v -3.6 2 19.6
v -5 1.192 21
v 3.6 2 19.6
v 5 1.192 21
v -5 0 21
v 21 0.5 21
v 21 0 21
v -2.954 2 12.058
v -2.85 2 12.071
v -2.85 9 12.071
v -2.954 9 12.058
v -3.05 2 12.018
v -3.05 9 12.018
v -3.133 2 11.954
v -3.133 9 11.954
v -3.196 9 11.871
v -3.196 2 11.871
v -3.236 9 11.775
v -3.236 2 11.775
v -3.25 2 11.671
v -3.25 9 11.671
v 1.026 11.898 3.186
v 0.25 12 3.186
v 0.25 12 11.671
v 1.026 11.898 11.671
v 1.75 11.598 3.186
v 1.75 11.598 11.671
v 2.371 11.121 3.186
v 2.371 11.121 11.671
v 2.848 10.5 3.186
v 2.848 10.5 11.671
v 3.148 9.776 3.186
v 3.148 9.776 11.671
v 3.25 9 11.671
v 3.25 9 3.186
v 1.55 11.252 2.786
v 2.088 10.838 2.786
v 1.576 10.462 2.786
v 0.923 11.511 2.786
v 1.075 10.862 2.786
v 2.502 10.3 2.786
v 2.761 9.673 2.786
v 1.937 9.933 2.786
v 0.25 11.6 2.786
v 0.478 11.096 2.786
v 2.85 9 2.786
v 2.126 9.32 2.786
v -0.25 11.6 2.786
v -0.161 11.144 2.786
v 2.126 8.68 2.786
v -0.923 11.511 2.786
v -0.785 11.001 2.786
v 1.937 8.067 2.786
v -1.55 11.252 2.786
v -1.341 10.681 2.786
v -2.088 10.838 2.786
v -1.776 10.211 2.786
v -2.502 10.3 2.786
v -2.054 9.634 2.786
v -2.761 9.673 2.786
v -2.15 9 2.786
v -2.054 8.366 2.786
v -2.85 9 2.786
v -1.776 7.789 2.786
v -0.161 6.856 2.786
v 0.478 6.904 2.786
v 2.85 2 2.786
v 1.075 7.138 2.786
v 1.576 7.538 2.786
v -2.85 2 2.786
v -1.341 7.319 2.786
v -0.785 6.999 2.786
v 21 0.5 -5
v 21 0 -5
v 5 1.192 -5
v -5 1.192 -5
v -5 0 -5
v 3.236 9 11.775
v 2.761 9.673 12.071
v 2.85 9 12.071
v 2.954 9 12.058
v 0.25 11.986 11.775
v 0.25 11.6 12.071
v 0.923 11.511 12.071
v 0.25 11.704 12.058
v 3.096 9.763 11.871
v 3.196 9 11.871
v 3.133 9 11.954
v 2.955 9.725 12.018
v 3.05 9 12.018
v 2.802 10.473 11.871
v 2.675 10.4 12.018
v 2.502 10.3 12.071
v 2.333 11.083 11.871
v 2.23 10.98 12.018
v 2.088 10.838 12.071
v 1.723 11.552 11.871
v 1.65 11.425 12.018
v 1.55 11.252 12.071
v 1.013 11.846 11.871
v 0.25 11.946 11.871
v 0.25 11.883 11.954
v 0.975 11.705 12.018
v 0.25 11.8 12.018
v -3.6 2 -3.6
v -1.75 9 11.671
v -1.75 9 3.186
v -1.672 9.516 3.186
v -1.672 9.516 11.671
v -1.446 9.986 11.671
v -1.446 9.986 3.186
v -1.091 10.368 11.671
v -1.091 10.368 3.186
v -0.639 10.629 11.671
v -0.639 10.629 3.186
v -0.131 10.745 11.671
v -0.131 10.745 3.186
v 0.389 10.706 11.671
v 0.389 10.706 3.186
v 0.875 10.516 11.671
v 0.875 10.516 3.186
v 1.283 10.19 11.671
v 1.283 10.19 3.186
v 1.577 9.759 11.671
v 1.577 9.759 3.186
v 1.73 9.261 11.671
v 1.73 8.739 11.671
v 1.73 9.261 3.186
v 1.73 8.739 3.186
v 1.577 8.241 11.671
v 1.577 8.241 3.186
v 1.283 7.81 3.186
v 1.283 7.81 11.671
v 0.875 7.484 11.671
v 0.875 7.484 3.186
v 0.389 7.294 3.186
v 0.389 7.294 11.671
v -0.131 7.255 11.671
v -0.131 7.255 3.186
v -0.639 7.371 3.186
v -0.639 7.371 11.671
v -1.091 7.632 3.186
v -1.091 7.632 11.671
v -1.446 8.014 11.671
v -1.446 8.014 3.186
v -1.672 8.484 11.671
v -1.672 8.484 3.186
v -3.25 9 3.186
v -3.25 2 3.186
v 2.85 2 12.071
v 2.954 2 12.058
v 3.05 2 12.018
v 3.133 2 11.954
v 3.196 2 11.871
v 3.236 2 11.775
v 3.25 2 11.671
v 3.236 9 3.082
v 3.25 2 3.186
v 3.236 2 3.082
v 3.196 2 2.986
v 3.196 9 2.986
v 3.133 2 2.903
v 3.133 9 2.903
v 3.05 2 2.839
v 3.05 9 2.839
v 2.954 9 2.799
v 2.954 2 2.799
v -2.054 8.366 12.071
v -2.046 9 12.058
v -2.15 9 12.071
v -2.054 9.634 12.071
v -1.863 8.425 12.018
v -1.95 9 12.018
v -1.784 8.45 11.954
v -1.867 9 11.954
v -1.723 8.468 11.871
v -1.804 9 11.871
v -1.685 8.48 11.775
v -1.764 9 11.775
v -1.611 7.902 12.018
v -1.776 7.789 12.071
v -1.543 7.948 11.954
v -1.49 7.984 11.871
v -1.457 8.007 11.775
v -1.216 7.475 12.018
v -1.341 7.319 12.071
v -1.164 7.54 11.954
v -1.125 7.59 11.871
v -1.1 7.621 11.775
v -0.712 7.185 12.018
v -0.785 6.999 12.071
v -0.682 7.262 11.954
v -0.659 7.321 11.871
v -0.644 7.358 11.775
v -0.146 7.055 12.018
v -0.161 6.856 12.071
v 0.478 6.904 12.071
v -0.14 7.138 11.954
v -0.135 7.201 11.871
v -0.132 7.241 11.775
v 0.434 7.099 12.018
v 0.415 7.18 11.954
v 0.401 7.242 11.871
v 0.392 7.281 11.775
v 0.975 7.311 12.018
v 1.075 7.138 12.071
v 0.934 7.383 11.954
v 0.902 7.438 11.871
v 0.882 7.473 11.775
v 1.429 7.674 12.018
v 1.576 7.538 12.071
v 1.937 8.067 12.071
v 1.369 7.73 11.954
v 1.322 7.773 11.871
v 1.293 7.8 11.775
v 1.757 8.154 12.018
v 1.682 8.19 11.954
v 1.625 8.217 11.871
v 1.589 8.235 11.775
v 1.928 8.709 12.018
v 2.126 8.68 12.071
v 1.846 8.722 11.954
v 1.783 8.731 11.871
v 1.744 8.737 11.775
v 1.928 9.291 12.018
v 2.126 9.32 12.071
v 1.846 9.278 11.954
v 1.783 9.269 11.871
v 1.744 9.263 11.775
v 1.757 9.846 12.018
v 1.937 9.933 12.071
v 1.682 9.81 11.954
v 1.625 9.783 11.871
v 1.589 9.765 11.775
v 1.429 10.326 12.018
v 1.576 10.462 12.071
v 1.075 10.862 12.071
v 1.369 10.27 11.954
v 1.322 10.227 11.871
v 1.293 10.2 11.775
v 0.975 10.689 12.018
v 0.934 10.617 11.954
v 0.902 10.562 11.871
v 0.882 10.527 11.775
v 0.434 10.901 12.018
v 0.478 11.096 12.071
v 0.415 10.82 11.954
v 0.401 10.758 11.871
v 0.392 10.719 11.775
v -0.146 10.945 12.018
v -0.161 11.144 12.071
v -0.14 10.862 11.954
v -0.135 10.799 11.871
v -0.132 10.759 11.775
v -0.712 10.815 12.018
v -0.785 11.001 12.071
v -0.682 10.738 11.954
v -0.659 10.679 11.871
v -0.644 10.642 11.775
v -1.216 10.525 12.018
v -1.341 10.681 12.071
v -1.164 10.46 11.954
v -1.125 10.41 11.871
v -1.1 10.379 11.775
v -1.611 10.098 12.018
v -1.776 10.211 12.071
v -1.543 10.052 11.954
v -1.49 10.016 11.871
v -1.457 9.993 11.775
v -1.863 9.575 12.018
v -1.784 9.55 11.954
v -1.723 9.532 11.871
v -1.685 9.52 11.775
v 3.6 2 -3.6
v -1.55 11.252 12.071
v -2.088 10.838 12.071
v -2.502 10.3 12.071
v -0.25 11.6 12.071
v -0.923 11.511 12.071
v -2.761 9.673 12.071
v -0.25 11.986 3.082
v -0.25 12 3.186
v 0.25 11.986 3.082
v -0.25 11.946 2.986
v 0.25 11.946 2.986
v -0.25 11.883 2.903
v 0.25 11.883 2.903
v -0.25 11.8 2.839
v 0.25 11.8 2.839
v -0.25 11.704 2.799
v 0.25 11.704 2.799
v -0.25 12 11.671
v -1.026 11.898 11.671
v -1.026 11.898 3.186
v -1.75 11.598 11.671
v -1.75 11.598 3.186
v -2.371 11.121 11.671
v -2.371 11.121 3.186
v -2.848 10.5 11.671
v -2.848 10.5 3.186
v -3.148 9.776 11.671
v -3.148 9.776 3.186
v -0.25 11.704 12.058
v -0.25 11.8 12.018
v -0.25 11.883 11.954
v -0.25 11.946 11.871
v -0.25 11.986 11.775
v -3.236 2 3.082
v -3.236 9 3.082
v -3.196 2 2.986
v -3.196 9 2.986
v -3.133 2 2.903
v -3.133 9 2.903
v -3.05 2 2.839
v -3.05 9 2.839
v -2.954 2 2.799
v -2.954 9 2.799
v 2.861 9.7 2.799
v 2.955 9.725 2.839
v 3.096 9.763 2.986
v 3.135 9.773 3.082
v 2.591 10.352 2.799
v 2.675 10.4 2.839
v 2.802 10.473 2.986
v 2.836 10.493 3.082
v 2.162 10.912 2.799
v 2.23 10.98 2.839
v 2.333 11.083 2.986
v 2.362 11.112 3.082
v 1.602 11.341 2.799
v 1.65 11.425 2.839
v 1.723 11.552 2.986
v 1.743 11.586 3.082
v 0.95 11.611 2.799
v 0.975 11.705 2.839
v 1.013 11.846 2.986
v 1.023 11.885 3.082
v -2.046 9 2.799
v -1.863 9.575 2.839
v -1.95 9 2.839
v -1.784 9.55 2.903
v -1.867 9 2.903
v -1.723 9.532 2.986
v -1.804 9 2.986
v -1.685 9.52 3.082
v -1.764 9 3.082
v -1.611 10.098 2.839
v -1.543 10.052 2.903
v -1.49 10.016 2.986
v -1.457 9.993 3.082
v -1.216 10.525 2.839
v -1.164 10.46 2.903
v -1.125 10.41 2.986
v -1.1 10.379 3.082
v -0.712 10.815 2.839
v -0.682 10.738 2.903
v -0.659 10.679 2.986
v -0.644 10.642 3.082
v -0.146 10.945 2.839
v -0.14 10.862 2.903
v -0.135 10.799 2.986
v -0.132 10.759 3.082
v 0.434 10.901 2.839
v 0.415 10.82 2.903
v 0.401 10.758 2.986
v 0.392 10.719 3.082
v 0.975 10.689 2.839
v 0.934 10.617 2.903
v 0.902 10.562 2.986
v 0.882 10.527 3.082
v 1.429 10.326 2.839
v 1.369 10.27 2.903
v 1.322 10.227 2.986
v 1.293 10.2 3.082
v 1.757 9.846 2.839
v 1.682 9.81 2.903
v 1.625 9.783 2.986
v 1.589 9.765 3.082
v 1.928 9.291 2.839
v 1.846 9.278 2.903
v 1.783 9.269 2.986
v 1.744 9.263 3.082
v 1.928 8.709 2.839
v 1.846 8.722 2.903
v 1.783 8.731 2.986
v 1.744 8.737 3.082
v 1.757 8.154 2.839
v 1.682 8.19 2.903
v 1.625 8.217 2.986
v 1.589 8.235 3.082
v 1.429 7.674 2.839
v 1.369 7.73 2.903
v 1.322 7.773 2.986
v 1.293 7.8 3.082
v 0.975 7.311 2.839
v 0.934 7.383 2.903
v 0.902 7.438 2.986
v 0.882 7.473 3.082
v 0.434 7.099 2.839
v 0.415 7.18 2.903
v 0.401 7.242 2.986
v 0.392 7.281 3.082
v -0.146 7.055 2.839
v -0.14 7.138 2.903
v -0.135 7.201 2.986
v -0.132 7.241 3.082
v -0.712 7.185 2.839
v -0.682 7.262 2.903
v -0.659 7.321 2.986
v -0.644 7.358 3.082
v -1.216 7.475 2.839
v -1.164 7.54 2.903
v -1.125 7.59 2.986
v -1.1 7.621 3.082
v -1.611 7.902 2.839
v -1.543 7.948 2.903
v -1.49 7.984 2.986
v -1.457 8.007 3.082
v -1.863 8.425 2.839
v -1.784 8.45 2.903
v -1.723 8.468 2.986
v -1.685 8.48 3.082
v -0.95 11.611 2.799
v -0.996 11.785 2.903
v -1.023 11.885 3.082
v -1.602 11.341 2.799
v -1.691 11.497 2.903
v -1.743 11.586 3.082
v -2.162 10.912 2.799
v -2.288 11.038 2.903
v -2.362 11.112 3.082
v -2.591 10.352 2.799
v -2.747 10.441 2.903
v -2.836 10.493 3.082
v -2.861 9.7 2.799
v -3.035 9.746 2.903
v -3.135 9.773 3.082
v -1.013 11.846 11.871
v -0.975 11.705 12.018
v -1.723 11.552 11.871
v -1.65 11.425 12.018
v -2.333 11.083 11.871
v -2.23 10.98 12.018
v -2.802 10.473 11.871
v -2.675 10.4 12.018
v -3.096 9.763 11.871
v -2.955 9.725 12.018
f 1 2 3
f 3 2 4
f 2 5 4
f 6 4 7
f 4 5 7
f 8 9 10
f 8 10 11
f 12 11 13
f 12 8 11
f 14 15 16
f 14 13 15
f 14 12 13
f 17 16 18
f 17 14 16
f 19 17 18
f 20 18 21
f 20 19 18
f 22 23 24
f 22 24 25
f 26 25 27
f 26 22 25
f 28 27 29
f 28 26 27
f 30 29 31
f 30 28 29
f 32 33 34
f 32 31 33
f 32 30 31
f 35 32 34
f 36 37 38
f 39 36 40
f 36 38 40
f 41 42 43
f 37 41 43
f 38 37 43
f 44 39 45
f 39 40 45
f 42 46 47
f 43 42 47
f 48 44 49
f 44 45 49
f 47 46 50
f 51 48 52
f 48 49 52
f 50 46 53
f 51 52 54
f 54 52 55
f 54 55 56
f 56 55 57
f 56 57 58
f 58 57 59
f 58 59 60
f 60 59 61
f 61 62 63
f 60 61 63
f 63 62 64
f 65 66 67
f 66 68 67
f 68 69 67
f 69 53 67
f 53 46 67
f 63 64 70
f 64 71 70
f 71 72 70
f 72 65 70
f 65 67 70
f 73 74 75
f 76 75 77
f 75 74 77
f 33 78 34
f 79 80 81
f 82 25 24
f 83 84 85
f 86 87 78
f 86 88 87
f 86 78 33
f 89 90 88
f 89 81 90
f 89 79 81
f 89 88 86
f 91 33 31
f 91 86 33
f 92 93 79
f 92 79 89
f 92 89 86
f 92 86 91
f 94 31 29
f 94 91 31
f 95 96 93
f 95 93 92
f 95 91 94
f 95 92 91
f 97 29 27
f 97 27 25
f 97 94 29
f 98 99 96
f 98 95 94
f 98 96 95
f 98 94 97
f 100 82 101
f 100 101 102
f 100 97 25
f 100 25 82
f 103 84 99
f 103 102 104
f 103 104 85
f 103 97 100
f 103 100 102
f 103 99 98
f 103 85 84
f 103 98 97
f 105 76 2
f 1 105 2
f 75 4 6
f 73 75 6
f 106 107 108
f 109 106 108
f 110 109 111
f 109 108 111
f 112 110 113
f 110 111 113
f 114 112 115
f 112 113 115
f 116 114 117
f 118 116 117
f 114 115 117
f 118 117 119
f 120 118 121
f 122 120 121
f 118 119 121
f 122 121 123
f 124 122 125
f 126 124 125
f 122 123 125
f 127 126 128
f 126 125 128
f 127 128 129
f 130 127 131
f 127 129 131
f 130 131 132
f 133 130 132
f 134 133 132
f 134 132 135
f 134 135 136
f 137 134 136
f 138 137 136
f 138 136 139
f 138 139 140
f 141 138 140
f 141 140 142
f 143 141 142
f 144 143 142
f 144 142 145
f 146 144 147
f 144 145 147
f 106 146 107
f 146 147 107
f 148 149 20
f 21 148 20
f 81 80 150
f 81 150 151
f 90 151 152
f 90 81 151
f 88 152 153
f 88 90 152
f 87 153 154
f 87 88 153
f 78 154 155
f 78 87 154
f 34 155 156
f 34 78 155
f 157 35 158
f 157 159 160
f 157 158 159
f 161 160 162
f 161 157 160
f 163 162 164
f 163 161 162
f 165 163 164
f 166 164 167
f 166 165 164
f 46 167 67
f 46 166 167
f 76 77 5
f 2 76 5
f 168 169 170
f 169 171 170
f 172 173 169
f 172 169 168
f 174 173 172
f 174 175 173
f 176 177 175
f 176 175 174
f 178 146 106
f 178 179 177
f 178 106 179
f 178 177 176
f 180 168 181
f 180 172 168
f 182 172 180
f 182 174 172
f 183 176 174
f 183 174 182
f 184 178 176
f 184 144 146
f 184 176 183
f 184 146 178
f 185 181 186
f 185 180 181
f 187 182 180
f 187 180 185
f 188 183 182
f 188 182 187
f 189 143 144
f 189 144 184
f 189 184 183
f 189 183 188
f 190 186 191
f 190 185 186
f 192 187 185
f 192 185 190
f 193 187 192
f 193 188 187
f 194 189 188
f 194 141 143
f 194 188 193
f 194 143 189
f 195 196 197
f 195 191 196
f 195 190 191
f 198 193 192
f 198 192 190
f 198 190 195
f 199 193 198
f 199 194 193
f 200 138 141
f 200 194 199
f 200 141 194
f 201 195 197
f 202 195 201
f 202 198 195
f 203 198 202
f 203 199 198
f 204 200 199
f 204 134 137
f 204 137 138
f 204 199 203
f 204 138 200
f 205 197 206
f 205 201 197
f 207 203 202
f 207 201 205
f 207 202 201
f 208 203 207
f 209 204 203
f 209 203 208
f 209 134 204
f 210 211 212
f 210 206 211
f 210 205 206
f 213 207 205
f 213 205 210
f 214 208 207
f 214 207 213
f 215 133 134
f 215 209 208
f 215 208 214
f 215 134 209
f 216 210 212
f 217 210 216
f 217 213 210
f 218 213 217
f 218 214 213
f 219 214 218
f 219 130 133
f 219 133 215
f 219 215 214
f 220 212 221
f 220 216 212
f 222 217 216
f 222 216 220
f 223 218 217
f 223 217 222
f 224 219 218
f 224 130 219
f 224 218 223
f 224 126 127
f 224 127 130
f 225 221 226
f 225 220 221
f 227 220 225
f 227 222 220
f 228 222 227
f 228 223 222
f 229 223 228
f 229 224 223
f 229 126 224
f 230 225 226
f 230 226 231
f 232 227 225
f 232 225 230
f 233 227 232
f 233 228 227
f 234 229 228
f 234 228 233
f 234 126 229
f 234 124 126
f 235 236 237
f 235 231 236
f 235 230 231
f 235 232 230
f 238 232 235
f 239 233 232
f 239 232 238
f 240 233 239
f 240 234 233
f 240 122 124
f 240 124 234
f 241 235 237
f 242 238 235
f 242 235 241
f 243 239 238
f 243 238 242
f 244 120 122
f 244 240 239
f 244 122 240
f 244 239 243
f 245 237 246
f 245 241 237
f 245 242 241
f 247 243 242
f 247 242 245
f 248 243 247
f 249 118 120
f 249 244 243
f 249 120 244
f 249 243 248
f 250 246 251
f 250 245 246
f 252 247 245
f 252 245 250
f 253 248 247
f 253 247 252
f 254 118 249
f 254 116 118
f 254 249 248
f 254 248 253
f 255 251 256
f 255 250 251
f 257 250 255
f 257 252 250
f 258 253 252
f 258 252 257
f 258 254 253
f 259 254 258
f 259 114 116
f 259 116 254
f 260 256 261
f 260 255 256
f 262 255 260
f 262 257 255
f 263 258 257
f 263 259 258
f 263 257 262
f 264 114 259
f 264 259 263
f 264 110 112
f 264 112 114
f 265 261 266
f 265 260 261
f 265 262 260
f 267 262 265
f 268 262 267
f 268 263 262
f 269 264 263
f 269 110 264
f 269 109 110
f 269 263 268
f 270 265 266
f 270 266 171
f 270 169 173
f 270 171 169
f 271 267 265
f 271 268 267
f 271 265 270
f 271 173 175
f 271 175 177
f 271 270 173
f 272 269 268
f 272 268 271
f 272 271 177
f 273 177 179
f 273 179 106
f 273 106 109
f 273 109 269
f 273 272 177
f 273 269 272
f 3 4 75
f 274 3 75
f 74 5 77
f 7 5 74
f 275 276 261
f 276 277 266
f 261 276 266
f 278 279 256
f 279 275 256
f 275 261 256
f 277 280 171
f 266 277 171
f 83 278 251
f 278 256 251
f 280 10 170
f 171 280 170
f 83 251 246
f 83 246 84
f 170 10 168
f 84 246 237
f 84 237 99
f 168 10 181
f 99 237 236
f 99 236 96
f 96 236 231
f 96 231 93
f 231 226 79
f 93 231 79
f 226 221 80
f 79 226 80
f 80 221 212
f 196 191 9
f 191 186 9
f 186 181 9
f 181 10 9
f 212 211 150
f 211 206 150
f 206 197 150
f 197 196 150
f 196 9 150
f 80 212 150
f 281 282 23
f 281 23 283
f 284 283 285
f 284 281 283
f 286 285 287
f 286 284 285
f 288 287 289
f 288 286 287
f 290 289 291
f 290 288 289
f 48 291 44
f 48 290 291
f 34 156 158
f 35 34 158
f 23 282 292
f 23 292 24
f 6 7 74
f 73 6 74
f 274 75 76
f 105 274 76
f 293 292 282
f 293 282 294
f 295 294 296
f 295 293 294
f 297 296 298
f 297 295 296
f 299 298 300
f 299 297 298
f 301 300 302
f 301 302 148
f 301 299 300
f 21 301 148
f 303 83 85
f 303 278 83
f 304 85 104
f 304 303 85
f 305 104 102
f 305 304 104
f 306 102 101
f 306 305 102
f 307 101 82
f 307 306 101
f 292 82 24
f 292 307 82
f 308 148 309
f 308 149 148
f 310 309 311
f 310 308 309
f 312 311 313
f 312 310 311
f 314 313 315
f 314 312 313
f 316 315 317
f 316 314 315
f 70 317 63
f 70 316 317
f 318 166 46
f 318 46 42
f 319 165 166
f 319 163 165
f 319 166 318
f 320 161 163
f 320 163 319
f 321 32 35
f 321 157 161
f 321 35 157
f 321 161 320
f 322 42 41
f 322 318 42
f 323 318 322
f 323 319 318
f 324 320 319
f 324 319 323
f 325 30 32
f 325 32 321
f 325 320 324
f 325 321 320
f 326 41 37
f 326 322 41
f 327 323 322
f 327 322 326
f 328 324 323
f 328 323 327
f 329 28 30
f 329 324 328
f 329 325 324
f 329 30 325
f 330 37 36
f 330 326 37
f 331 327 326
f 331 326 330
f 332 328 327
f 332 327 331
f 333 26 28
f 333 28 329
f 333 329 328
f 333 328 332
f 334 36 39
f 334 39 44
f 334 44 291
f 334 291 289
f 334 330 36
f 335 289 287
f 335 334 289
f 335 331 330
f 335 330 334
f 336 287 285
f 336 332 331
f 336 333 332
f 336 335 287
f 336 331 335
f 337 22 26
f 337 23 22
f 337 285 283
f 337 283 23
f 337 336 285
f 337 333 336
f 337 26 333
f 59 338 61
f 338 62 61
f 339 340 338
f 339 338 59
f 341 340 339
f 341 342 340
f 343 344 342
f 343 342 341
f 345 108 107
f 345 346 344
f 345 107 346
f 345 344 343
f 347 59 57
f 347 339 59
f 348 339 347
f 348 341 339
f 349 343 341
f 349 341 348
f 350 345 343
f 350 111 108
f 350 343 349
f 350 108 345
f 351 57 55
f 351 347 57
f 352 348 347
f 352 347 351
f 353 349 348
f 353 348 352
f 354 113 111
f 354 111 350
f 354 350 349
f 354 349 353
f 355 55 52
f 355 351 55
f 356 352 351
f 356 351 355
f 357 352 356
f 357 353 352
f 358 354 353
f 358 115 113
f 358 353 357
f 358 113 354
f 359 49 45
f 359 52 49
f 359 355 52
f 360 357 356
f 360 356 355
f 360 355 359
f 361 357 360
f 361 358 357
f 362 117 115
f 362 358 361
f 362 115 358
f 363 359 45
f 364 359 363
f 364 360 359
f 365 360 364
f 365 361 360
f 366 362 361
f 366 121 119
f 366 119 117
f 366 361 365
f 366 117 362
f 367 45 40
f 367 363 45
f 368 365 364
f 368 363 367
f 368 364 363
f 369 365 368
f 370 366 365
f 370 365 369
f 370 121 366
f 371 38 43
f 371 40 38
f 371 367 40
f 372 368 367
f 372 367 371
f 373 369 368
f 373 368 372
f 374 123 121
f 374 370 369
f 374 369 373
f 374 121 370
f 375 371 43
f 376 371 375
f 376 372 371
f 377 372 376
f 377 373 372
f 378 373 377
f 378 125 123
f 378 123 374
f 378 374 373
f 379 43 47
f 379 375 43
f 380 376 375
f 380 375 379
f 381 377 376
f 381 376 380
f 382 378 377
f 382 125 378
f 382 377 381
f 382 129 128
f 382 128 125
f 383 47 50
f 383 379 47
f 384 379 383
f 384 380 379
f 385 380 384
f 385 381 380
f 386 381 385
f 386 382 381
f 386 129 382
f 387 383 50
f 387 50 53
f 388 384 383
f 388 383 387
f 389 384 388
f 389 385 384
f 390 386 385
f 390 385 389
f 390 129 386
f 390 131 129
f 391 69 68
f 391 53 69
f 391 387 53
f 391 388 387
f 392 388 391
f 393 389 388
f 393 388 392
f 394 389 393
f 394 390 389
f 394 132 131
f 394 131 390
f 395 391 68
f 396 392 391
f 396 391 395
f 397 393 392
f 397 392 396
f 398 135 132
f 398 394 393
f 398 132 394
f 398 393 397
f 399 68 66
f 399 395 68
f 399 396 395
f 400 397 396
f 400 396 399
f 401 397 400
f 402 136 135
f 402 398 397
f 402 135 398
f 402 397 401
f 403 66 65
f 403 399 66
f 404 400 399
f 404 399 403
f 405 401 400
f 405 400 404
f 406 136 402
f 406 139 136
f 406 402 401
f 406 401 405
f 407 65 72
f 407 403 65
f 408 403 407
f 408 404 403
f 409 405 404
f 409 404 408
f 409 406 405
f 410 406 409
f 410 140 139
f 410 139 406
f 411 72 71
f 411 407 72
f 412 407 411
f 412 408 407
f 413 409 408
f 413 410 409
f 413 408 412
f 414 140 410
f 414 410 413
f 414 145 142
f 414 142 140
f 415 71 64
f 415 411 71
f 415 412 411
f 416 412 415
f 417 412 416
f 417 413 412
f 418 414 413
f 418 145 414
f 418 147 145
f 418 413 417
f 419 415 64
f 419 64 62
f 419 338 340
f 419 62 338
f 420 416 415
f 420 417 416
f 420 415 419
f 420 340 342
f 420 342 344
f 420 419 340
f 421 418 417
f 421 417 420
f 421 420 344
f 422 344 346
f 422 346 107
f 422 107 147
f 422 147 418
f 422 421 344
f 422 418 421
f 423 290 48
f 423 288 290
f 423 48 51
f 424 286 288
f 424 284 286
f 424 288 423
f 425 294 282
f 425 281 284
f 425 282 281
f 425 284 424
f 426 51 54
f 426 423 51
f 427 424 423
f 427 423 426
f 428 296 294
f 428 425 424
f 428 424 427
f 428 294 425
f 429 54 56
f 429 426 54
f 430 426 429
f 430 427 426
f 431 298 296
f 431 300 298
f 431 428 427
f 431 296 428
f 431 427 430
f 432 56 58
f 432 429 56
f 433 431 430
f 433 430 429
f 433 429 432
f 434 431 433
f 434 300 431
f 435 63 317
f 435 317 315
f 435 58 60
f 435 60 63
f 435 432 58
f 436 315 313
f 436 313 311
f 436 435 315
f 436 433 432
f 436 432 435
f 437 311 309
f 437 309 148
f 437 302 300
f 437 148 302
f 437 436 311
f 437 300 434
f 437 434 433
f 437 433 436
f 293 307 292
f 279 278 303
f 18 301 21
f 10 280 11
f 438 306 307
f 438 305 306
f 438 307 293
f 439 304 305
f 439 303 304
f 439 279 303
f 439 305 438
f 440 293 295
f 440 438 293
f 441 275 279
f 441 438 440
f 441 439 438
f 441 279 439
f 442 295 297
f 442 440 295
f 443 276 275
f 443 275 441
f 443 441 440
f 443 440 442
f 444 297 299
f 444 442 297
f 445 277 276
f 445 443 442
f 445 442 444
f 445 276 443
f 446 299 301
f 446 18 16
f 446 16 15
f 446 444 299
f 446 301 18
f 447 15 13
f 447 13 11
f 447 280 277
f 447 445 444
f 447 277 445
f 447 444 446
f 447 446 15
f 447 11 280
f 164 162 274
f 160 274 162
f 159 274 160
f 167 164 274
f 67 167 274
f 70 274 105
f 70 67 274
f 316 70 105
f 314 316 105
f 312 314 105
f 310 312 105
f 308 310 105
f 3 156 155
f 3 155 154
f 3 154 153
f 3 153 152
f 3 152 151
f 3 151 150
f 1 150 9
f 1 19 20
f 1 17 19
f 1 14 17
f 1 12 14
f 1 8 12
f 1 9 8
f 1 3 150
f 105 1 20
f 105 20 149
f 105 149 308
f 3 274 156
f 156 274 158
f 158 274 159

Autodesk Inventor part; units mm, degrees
ref_plane "YZ Plane" through (0, 0, 0) normal (1, 0, 0) x (0, 1, 0)
ref_plane "XZ Plane" through (0, 0, 0) normal (0, 1, 0) x (-1, 0, 0)
ref_plane "XY Plane" through (0, 0, 0) normal (0, 0, 1) x (1, 0, 0)
sketch "Эскиз1" plane through (0, 0, 0) normal (0, 1, 0) x (-1, 0, 0)
  line L0 (3.5, 13) -> (-3.5, 13)
  line L1 (-3.5, 13) -> (-3.5, 3)
  line L2 (-3.5, 3) -> (3.5, 3)
  line L3 (3.5, 3) -> (3.5, 13)
  line L4 (3.5, 13) -> (-3.5, 3) construction
  line L5 (-3.5, 13) -> (3.5, 3) construction
  line L6 (5, 21) -> (-5, 21)
  line L7 (-5, 21) -> (-5, -5)
  line L8 (-5, -5) -> (5, -5)
  line L9 (5, -5) -> (5, 21)
  line L10 (5, 21) -> (-5, -5) construction
  line L11 (-5, 21) -> (5, -5) construction
  point P0 (0, 0)
  point P1 (0, 8)
  point P2 (0, 8)
  dimension "d0" = 7
  dimension "d1" = 10
extrude "Выдавливание1" add sketch "Эскиз1" along normal blind 2 contours L3 L2 L1 L0 | L9 L8 L7 L6
sketch "Эскиз2" plane through (0, 2, 0) normal (0, 1, 0) x (1, 0, 0)
  line L0 (-5, -21) -> (5, -21) projected
  line L1 (5, -21) -> (5, 5) projected
  line L2 (5, 5) -> (-5, 5) projected
  line L3 (-5, 5) -> (-5, -21) projected
  point P0 (0, 0)
chamfer "Фаска1" distance 1.4 angle 30 4 edges at (0, 2, 21) (5, 2, 8) (0, 2, -5) (-5, 2, 8) measured on face at (1.6667, 2, 12.3333)
sketch "Эскиз3" plane through (0, 2, 0) normal (0, 1, 0) x (1, 0, 0)
  line L0 (-3.25, -12.0714) -> (3.25, -12.0714)
  line L1 (3.25, -12.0714) -> (3.25, -2.7857)
  line L2 (3.25, -2.7857) -> (-3.25, -2.7857)
  line L3 (-3.25, -2.7857) -> (-3.25, -12.0714)
  line L4 (-3.25, -12.0714) -> (3.25, -2.7857) construction
  line L5 (3.25, -12.0714) -> (-3.25, -2.7857) construction
  point P0 (0, 0)
  point P1 (0, -7.4286)
  dimension "d7" = 6.5
extrude "Выдавливание2" add sketch "Эскиз3" along normal blind 10
fillet "Сопряжение1" radius 3 2 edges at (3.25, 12, 7.4286) (-3.25, 12, 7.4286)
sketch "Эскиз4" plane through (3.25, 2, 2.7857) normal (0, 0, -1) x (-1, 0, 0)
  line L0 (3, 10) -> (3.5, 10) projected
  line L1 (3.25, 10) -> (3.25, 7)
  circle A0 centre (3.25, 7) radius 1.75
  point P0 (3.25, -2)
  dimension "d11" = 3
  dimension "d12" = 3.5
extrude "Выдавливание3" cut sketch "Эскиз4" against normal blind 10
fillet "Сопряжение2" radius 0.4 2 edges at (1.75, 9, 2.7857) (1.75, 9, 12.0714)
fillet "Сопряжение3" radius 0.4 10 edges at (3.25, 5.5, 12.0714) (0, 12, 12.0714) (-2.3713, 11.1213, 12.0714) (-3.25, 5.5, 12.0714) (2.3713, 11.1213, 12.0714) (0, 12, 2.7857) (-2.3713, 11.1213, 2.7857) (-3.25, 5.5, 2.7857) (3.25, 5.5, 2.7857) (2.3713, 11.1213, 2.7857)
sketch "Эскиз5" plane through (0, 0, 0) normal (0, -1, 0) x (1, 0, 0)
  line L0 (-5, 21) -> (5, 21) projected
  line L1 (-5, -5) -> (-5, 21) projected
  line L2 (5, -5) -> (-5, -5) projected
  line L3 (5, 21) -> (5, -5) projected
  line L4 (-5, 21) -> (21, 21)
  line L5 (21, 21) -> (21, -5)
  line L6 (21, -5) -> (-5, -5)
  line L7 (-5, -5) -> (-5, 21)
  point P0 (0, 0)
extrude "Выдавливание4" add sketch "Эскиз5" against normal blind 2 contours L4 L5 L6 L3
sketch "Эскиз6" plane through (-5, 0, -5) normal (0, 0, -1) x (-1, 0, 0)
  line L0 (-10, 1.1917) -> (0, 1.1917) projected
  line L1 (-10, 1.1917) -> (-10, 2) projected
  line L2 (-26, 2) -> (-10, 2) projected
  line L3 (-26, 0) -> (-26, 2) projected
  line L4 (0, 0) -> (-26, 0) projected
  line L5 (0, 0) -> (0, 1.1917) projected
  point P0 (-5, 0)
sketch "Эскиз7" plane through (-5, 0, -5) normal (0, 0, -1) x (-1, 0, 0)
  line L0 (-10, 1.1917) -> (0, 1.1917) projected
  line L1 (-10, 1.1917) -> (-10, 2) projected
  line L2 (0, 0) -> (-26, 0) projected
  line L3 (0, 0) -> (0, 1.1917) projected
  line L4 (-10, 2) -> (-26, 2)
  line L5 (-26, 2) -> (-26, 0.5)
  line L6 (-26, 0) -> (-10, 0)
  line L7 (-10, 0) -> (-10, 1.1917)
  line L8 (-26, 1) -> (-26, 0)
  line L9 (-10, 1.1917) -> (-26, 0.5)
  line L10 (-26, 0.5) -> (-26, 0)
  line L11 (-10, 1.1917) -> (-10, 2)
  line L12 (-10, 1.1917) -> (-10, 2)
  line L13 (-10, 0) -> (-10, 1.1917)
  point P0 (-5, 0)
extrude "Выдавливание5" cut sketch "Эскиз7" against normal blind 26 contours L9 L5 L4 L1
properties part number "ESP_DISP_LG"
